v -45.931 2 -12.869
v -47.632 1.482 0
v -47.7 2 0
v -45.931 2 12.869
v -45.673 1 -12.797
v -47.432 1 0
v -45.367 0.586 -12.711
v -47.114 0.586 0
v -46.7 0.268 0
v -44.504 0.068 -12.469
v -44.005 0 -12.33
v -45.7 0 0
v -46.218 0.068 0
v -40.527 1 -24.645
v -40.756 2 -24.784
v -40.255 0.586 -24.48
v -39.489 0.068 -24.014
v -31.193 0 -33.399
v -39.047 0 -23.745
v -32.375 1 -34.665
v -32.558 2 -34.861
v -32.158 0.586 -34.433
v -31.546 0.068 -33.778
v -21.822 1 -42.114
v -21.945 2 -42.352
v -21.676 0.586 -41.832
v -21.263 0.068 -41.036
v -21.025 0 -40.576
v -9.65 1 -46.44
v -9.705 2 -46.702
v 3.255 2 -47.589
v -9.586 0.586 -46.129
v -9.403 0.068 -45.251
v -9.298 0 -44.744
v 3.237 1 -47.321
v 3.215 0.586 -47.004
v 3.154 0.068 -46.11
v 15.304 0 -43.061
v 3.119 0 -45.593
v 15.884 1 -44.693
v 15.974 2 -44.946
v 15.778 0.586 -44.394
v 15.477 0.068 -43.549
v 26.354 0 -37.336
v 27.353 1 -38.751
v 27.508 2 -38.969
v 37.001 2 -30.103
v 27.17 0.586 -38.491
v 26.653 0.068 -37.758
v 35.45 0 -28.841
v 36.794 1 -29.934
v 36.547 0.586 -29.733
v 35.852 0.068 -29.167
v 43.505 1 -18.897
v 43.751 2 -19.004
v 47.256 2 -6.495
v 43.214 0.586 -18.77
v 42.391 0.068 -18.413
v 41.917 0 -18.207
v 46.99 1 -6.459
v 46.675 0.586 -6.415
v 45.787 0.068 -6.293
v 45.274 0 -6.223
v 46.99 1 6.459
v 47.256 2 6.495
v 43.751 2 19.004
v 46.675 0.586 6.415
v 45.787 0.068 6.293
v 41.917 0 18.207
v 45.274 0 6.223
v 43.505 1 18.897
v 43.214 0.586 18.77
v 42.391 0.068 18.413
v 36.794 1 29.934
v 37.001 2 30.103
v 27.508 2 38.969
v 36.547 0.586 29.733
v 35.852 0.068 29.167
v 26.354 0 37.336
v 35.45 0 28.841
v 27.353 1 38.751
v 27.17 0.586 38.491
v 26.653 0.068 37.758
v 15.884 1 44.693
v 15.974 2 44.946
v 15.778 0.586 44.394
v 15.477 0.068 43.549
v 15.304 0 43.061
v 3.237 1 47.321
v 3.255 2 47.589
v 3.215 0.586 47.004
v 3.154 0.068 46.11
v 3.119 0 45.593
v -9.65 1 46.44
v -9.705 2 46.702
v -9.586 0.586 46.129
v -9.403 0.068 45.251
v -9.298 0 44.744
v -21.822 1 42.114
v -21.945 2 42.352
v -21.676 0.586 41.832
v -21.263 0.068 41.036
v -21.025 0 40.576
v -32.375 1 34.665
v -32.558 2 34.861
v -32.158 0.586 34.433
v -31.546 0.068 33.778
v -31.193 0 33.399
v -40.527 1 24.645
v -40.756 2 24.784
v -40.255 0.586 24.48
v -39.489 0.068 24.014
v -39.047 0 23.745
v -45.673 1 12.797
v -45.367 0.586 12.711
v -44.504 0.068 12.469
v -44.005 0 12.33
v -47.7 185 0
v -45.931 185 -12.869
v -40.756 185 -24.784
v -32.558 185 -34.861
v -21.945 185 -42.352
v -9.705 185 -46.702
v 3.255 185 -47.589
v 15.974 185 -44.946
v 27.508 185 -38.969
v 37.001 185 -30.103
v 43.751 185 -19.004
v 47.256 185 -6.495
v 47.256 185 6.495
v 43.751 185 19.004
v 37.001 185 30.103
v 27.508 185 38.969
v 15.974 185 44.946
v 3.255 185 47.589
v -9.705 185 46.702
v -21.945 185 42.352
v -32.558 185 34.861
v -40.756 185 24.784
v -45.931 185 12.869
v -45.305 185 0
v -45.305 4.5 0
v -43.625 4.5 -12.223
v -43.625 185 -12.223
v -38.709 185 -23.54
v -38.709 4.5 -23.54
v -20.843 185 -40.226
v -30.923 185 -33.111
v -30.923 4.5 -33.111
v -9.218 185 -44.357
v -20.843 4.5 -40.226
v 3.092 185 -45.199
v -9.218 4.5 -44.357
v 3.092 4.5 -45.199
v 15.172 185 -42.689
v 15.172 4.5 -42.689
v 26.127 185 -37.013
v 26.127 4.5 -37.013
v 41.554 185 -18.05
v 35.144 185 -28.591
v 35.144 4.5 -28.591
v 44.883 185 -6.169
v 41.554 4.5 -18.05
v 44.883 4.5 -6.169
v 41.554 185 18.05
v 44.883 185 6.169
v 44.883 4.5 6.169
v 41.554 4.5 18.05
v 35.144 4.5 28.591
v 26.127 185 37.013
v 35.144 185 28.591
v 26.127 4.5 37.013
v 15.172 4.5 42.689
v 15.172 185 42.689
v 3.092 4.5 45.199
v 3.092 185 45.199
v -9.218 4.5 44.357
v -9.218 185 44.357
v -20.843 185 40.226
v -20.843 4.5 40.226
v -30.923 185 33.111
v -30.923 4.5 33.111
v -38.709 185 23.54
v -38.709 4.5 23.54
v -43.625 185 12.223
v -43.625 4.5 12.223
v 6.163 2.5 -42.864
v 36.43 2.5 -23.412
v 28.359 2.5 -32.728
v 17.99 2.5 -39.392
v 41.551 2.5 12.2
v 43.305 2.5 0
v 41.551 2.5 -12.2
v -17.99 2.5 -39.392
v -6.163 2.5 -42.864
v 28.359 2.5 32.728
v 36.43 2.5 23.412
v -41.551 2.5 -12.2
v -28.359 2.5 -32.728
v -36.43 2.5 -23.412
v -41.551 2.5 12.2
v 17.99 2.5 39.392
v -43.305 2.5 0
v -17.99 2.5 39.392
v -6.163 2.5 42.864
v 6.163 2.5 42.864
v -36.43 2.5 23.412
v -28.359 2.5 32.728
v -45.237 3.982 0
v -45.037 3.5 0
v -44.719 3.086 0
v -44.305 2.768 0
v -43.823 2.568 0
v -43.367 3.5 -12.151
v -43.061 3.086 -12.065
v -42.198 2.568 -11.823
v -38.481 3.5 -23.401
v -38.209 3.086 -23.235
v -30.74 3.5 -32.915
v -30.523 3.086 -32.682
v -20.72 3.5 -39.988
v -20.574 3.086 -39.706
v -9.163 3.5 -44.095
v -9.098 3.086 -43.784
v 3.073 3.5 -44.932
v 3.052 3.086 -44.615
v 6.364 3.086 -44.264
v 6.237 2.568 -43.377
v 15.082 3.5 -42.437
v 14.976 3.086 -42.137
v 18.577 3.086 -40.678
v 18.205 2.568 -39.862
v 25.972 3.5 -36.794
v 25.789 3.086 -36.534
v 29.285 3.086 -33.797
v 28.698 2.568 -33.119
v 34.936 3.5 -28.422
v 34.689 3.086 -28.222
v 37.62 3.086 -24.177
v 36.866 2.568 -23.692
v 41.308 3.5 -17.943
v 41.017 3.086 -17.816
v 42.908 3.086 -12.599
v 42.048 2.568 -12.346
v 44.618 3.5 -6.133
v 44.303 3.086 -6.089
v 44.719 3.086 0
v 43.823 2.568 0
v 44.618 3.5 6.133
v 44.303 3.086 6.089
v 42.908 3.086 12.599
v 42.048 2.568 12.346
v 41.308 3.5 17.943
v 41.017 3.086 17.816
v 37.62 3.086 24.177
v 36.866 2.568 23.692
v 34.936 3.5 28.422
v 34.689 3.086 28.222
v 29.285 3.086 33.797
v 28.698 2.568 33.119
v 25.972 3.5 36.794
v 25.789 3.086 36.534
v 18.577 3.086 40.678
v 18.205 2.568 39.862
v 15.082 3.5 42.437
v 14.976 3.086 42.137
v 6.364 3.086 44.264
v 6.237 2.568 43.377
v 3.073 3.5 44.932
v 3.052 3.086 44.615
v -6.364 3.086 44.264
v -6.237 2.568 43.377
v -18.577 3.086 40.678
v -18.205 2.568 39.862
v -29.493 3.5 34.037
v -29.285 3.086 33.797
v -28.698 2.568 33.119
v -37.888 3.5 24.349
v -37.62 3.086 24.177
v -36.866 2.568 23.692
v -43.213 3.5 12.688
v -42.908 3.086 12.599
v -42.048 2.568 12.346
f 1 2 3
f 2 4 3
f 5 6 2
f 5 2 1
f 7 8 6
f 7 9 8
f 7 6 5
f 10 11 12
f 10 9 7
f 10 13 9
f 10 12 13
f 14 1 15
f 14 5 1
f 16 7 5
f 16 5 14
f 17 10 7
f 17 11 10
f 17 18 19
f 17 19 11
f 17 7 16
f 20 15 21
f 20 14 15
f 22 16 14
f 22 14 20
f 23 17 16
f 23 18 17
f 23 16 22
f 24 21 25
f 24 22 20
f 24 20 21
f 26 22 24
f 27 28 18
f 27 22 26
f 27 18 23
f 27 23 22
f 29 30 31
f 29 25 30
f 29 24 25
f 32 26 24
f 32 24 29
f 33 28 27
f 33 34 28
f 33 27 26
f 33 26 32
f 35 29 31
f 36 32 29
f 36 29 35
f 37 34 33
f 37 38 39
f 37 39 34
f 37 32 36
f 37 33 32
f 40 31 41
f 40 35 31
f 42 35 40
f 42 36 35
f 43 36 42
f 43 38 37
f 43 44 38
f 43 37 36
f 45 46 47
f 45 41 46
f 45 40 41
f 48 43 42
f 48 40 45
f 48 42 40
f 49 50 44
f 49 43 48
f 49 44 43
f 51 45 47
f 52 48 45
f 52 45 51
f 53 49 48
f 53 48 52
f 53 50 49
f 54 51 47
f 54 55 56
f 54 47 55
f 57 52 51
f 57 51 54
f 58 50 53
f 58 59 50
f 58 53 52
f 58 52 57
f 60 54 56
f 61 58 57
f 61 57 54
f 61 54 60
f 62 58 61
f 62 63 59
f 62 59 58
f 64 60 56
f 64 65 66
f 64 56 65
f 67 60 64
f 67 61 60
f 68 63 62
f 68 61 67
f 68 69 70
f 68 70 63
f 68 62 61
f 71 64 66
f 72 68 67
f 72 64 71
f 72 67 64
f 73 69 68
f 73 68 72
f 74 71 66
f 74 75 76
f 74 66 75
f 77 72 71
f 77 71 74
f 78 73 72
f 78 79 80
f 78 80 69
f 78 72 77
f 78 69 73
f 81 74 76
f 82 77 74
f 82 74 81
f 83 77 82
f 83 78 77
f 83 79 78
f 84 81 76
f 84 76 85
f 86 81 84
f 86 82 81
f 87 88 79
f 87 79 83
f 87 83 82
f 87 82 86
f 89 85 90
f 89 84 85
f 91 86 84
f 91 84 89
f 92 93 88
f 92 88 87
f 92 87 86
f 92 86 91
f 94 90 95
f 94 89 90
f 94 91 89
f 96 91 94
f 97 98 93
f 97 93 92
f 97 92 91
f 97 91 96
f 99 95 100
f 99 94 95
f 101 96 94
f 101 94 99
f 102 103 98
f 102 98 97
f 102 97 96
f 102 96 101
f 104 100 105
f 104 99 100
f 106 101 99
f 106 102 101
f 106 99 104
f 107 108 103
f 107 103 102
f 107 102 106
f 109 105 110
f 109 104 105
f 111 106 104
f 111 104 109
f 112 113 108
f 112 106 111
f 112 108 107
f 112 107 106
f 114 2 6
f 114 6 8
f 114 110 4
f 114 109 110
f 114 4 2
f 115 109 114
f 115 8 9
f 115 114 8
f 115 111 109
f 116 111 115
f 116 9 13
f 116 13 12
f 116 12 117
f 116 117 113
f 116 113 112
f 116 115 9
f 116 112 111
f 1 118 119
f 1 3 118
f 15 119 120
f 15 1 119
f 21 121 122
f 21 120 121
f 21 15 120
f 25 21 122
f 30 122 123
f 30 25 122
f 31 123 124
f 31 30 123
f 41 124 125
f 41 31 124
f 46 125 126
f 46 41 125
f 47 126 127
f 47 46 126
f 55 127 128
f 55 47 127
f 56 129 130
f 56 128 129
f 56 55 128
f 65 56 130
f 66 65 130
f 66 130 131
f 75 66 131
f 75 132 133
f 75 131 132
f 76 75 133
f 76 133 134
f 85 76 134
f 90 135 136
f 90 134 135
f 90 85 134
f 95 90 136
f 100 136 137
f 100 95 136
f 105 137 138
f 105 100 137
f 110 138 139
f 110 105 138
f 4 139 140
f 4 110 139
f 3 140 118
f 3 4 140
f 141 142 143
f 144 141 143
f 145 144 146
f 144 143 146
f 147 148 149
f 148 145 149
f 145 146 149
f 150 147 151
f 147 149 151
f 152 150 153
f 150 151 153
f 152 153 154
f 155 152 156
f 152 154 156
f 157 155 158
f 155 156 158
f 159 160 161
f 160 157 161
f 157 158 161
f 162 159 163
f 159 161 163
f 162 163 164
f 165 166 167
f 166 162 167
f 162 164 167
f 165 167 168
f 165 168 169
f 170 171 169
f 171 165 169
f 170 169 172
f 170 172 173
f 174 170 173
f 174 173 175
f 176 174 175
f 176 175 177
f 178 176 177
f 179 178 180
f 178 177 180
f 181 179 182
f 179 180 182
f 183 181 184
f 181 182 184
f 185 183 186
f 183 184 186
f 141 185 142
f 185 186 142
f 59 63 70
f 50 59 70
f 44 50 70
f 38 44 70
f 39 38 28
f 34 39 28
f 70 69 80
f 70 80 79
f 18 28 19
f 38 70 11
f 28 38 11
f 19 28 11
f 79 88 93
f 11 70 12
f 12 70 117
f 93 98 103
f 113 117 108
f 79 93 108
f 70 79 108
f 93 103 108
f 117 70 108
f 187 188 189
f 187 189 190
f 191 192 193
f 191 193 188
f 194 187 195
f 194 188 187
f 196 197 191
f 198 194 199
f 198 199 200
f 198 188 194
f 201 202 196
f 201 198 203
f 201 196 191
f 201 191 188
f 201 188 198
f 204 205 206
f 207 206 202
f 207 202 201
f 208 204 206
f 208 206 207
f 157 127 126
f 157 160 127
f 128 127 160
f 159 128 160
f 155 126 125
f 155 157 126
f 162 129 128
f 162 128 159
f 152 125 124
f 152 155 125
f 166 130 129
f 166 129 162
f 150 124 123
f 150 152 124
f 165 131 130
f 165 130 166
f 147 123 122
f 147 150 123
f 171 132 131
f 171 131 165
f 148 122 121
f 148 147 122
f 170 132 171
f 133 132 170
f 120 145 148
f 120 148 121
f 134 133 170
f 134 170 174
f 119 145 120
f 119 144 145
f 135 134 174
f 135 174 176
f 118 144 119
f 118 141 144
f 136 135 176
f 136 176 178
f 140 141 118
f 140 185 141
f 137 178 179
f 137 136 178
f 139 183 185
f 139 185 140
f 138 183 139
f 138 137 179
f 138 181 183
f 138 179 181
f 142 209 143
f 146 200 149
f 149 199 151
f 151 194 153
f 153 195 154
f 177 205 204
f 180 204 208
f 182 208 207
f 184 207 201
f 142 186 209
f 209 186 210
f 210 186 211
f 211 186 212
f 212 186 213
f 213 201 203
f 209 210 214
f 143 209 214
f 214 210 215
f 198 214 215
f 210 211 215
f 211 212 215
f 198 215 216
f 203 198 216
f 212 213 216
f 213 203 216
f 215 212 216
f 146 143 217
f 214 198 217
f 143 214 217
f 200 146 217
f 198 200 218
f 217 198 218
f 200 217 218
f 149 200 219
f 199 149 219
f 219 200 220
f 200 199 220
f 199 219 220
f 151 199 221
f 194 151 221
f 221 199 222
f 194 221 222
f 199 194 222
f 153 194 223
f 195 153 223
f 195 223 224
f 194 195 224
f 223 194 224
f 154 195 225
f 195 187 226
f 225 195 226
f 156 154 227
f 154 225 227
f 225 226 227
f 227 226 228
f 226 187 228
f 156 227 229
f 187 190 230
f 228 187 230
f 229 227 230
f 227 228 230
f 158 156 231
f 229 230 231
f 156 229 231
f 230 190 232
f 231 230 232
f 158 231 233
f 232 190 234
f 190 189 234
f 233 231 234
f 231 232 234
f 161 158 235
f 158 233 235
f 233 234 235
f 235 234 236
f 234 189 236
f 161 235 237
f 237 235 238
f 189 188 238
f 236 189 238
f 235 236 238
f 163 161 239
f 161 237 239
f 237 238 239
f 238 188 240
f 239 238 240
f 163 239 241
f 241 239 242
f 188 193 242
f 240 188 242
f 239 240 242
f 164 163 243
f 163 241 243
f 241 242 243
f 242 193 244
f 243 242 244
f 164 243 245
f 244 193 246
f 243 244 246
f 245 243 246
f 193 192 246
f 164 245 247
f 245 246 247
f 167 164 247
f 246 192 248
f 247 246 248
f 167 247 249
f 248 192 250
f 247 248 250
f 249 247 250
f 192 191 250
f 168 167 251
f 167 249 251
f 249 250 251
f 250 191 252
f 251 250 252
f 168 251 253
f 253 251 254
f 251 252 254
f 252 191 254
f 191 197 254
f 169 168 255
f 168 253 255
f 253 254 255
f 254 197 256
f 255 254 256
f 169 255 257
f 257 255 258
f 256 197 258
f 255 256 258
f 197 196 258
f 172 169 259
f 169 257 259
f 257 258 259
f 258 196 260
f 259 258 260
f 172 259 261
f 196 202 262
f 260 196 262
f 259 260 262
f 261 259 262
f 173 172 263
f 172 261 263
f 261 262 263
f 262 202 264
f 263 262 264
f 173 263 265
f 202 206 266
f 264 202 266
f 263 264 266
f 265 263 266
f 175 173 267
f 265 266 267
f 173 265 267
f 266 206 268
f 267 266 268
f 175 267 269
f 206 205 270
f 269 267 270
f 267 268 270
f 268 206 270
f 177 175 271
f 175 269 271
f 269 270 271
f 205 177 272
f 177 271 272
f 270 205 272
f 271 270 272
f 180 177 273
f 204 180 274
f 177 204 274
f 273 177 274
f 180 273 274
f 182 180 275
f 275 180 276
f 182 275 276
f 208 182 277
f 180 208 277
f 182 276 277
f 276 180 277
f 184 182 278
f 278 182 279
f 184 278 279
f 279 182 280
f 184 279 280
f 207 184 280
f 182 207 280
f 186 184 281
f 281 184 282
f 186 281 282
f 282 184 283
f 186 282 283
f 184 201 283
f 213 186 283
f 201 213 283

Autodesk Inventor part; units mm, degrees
ref_plane "YZ Plane" through (0, 0, 0) normal (1, 0, 0) x (0, 1, 0)
ref_plane "XZ Plane" through (0, 0, 0) normal (0, 1, 0) x (-1, 0, 0)
ref_plane "XY Plane" through (0, 0, 0) normal (0, 0, 1) x (1, 0, 0)
sketch "Esquisse1" plane through (0, 0, 0) normal (0, 1, 0) x (-1, 0, 0)
  circle A0 centre (0, 0) radius 45.305
  circle A1 centre (0, 0) radius 47.7
  dimension "d0" = 90.61
  dimension "d1" = 95.4
extrude "Extrusion1" add sketch "Esquisse1" along normal blind 185
extrude "Extrusion2" add sketch "Esquisse1" along normal blind 2.5 contours A0
fillet "Congé1" radius 2 2 edges at (45.305, 2.5, 0) (47.7, 0, 0)
properties part number "Bocal"
